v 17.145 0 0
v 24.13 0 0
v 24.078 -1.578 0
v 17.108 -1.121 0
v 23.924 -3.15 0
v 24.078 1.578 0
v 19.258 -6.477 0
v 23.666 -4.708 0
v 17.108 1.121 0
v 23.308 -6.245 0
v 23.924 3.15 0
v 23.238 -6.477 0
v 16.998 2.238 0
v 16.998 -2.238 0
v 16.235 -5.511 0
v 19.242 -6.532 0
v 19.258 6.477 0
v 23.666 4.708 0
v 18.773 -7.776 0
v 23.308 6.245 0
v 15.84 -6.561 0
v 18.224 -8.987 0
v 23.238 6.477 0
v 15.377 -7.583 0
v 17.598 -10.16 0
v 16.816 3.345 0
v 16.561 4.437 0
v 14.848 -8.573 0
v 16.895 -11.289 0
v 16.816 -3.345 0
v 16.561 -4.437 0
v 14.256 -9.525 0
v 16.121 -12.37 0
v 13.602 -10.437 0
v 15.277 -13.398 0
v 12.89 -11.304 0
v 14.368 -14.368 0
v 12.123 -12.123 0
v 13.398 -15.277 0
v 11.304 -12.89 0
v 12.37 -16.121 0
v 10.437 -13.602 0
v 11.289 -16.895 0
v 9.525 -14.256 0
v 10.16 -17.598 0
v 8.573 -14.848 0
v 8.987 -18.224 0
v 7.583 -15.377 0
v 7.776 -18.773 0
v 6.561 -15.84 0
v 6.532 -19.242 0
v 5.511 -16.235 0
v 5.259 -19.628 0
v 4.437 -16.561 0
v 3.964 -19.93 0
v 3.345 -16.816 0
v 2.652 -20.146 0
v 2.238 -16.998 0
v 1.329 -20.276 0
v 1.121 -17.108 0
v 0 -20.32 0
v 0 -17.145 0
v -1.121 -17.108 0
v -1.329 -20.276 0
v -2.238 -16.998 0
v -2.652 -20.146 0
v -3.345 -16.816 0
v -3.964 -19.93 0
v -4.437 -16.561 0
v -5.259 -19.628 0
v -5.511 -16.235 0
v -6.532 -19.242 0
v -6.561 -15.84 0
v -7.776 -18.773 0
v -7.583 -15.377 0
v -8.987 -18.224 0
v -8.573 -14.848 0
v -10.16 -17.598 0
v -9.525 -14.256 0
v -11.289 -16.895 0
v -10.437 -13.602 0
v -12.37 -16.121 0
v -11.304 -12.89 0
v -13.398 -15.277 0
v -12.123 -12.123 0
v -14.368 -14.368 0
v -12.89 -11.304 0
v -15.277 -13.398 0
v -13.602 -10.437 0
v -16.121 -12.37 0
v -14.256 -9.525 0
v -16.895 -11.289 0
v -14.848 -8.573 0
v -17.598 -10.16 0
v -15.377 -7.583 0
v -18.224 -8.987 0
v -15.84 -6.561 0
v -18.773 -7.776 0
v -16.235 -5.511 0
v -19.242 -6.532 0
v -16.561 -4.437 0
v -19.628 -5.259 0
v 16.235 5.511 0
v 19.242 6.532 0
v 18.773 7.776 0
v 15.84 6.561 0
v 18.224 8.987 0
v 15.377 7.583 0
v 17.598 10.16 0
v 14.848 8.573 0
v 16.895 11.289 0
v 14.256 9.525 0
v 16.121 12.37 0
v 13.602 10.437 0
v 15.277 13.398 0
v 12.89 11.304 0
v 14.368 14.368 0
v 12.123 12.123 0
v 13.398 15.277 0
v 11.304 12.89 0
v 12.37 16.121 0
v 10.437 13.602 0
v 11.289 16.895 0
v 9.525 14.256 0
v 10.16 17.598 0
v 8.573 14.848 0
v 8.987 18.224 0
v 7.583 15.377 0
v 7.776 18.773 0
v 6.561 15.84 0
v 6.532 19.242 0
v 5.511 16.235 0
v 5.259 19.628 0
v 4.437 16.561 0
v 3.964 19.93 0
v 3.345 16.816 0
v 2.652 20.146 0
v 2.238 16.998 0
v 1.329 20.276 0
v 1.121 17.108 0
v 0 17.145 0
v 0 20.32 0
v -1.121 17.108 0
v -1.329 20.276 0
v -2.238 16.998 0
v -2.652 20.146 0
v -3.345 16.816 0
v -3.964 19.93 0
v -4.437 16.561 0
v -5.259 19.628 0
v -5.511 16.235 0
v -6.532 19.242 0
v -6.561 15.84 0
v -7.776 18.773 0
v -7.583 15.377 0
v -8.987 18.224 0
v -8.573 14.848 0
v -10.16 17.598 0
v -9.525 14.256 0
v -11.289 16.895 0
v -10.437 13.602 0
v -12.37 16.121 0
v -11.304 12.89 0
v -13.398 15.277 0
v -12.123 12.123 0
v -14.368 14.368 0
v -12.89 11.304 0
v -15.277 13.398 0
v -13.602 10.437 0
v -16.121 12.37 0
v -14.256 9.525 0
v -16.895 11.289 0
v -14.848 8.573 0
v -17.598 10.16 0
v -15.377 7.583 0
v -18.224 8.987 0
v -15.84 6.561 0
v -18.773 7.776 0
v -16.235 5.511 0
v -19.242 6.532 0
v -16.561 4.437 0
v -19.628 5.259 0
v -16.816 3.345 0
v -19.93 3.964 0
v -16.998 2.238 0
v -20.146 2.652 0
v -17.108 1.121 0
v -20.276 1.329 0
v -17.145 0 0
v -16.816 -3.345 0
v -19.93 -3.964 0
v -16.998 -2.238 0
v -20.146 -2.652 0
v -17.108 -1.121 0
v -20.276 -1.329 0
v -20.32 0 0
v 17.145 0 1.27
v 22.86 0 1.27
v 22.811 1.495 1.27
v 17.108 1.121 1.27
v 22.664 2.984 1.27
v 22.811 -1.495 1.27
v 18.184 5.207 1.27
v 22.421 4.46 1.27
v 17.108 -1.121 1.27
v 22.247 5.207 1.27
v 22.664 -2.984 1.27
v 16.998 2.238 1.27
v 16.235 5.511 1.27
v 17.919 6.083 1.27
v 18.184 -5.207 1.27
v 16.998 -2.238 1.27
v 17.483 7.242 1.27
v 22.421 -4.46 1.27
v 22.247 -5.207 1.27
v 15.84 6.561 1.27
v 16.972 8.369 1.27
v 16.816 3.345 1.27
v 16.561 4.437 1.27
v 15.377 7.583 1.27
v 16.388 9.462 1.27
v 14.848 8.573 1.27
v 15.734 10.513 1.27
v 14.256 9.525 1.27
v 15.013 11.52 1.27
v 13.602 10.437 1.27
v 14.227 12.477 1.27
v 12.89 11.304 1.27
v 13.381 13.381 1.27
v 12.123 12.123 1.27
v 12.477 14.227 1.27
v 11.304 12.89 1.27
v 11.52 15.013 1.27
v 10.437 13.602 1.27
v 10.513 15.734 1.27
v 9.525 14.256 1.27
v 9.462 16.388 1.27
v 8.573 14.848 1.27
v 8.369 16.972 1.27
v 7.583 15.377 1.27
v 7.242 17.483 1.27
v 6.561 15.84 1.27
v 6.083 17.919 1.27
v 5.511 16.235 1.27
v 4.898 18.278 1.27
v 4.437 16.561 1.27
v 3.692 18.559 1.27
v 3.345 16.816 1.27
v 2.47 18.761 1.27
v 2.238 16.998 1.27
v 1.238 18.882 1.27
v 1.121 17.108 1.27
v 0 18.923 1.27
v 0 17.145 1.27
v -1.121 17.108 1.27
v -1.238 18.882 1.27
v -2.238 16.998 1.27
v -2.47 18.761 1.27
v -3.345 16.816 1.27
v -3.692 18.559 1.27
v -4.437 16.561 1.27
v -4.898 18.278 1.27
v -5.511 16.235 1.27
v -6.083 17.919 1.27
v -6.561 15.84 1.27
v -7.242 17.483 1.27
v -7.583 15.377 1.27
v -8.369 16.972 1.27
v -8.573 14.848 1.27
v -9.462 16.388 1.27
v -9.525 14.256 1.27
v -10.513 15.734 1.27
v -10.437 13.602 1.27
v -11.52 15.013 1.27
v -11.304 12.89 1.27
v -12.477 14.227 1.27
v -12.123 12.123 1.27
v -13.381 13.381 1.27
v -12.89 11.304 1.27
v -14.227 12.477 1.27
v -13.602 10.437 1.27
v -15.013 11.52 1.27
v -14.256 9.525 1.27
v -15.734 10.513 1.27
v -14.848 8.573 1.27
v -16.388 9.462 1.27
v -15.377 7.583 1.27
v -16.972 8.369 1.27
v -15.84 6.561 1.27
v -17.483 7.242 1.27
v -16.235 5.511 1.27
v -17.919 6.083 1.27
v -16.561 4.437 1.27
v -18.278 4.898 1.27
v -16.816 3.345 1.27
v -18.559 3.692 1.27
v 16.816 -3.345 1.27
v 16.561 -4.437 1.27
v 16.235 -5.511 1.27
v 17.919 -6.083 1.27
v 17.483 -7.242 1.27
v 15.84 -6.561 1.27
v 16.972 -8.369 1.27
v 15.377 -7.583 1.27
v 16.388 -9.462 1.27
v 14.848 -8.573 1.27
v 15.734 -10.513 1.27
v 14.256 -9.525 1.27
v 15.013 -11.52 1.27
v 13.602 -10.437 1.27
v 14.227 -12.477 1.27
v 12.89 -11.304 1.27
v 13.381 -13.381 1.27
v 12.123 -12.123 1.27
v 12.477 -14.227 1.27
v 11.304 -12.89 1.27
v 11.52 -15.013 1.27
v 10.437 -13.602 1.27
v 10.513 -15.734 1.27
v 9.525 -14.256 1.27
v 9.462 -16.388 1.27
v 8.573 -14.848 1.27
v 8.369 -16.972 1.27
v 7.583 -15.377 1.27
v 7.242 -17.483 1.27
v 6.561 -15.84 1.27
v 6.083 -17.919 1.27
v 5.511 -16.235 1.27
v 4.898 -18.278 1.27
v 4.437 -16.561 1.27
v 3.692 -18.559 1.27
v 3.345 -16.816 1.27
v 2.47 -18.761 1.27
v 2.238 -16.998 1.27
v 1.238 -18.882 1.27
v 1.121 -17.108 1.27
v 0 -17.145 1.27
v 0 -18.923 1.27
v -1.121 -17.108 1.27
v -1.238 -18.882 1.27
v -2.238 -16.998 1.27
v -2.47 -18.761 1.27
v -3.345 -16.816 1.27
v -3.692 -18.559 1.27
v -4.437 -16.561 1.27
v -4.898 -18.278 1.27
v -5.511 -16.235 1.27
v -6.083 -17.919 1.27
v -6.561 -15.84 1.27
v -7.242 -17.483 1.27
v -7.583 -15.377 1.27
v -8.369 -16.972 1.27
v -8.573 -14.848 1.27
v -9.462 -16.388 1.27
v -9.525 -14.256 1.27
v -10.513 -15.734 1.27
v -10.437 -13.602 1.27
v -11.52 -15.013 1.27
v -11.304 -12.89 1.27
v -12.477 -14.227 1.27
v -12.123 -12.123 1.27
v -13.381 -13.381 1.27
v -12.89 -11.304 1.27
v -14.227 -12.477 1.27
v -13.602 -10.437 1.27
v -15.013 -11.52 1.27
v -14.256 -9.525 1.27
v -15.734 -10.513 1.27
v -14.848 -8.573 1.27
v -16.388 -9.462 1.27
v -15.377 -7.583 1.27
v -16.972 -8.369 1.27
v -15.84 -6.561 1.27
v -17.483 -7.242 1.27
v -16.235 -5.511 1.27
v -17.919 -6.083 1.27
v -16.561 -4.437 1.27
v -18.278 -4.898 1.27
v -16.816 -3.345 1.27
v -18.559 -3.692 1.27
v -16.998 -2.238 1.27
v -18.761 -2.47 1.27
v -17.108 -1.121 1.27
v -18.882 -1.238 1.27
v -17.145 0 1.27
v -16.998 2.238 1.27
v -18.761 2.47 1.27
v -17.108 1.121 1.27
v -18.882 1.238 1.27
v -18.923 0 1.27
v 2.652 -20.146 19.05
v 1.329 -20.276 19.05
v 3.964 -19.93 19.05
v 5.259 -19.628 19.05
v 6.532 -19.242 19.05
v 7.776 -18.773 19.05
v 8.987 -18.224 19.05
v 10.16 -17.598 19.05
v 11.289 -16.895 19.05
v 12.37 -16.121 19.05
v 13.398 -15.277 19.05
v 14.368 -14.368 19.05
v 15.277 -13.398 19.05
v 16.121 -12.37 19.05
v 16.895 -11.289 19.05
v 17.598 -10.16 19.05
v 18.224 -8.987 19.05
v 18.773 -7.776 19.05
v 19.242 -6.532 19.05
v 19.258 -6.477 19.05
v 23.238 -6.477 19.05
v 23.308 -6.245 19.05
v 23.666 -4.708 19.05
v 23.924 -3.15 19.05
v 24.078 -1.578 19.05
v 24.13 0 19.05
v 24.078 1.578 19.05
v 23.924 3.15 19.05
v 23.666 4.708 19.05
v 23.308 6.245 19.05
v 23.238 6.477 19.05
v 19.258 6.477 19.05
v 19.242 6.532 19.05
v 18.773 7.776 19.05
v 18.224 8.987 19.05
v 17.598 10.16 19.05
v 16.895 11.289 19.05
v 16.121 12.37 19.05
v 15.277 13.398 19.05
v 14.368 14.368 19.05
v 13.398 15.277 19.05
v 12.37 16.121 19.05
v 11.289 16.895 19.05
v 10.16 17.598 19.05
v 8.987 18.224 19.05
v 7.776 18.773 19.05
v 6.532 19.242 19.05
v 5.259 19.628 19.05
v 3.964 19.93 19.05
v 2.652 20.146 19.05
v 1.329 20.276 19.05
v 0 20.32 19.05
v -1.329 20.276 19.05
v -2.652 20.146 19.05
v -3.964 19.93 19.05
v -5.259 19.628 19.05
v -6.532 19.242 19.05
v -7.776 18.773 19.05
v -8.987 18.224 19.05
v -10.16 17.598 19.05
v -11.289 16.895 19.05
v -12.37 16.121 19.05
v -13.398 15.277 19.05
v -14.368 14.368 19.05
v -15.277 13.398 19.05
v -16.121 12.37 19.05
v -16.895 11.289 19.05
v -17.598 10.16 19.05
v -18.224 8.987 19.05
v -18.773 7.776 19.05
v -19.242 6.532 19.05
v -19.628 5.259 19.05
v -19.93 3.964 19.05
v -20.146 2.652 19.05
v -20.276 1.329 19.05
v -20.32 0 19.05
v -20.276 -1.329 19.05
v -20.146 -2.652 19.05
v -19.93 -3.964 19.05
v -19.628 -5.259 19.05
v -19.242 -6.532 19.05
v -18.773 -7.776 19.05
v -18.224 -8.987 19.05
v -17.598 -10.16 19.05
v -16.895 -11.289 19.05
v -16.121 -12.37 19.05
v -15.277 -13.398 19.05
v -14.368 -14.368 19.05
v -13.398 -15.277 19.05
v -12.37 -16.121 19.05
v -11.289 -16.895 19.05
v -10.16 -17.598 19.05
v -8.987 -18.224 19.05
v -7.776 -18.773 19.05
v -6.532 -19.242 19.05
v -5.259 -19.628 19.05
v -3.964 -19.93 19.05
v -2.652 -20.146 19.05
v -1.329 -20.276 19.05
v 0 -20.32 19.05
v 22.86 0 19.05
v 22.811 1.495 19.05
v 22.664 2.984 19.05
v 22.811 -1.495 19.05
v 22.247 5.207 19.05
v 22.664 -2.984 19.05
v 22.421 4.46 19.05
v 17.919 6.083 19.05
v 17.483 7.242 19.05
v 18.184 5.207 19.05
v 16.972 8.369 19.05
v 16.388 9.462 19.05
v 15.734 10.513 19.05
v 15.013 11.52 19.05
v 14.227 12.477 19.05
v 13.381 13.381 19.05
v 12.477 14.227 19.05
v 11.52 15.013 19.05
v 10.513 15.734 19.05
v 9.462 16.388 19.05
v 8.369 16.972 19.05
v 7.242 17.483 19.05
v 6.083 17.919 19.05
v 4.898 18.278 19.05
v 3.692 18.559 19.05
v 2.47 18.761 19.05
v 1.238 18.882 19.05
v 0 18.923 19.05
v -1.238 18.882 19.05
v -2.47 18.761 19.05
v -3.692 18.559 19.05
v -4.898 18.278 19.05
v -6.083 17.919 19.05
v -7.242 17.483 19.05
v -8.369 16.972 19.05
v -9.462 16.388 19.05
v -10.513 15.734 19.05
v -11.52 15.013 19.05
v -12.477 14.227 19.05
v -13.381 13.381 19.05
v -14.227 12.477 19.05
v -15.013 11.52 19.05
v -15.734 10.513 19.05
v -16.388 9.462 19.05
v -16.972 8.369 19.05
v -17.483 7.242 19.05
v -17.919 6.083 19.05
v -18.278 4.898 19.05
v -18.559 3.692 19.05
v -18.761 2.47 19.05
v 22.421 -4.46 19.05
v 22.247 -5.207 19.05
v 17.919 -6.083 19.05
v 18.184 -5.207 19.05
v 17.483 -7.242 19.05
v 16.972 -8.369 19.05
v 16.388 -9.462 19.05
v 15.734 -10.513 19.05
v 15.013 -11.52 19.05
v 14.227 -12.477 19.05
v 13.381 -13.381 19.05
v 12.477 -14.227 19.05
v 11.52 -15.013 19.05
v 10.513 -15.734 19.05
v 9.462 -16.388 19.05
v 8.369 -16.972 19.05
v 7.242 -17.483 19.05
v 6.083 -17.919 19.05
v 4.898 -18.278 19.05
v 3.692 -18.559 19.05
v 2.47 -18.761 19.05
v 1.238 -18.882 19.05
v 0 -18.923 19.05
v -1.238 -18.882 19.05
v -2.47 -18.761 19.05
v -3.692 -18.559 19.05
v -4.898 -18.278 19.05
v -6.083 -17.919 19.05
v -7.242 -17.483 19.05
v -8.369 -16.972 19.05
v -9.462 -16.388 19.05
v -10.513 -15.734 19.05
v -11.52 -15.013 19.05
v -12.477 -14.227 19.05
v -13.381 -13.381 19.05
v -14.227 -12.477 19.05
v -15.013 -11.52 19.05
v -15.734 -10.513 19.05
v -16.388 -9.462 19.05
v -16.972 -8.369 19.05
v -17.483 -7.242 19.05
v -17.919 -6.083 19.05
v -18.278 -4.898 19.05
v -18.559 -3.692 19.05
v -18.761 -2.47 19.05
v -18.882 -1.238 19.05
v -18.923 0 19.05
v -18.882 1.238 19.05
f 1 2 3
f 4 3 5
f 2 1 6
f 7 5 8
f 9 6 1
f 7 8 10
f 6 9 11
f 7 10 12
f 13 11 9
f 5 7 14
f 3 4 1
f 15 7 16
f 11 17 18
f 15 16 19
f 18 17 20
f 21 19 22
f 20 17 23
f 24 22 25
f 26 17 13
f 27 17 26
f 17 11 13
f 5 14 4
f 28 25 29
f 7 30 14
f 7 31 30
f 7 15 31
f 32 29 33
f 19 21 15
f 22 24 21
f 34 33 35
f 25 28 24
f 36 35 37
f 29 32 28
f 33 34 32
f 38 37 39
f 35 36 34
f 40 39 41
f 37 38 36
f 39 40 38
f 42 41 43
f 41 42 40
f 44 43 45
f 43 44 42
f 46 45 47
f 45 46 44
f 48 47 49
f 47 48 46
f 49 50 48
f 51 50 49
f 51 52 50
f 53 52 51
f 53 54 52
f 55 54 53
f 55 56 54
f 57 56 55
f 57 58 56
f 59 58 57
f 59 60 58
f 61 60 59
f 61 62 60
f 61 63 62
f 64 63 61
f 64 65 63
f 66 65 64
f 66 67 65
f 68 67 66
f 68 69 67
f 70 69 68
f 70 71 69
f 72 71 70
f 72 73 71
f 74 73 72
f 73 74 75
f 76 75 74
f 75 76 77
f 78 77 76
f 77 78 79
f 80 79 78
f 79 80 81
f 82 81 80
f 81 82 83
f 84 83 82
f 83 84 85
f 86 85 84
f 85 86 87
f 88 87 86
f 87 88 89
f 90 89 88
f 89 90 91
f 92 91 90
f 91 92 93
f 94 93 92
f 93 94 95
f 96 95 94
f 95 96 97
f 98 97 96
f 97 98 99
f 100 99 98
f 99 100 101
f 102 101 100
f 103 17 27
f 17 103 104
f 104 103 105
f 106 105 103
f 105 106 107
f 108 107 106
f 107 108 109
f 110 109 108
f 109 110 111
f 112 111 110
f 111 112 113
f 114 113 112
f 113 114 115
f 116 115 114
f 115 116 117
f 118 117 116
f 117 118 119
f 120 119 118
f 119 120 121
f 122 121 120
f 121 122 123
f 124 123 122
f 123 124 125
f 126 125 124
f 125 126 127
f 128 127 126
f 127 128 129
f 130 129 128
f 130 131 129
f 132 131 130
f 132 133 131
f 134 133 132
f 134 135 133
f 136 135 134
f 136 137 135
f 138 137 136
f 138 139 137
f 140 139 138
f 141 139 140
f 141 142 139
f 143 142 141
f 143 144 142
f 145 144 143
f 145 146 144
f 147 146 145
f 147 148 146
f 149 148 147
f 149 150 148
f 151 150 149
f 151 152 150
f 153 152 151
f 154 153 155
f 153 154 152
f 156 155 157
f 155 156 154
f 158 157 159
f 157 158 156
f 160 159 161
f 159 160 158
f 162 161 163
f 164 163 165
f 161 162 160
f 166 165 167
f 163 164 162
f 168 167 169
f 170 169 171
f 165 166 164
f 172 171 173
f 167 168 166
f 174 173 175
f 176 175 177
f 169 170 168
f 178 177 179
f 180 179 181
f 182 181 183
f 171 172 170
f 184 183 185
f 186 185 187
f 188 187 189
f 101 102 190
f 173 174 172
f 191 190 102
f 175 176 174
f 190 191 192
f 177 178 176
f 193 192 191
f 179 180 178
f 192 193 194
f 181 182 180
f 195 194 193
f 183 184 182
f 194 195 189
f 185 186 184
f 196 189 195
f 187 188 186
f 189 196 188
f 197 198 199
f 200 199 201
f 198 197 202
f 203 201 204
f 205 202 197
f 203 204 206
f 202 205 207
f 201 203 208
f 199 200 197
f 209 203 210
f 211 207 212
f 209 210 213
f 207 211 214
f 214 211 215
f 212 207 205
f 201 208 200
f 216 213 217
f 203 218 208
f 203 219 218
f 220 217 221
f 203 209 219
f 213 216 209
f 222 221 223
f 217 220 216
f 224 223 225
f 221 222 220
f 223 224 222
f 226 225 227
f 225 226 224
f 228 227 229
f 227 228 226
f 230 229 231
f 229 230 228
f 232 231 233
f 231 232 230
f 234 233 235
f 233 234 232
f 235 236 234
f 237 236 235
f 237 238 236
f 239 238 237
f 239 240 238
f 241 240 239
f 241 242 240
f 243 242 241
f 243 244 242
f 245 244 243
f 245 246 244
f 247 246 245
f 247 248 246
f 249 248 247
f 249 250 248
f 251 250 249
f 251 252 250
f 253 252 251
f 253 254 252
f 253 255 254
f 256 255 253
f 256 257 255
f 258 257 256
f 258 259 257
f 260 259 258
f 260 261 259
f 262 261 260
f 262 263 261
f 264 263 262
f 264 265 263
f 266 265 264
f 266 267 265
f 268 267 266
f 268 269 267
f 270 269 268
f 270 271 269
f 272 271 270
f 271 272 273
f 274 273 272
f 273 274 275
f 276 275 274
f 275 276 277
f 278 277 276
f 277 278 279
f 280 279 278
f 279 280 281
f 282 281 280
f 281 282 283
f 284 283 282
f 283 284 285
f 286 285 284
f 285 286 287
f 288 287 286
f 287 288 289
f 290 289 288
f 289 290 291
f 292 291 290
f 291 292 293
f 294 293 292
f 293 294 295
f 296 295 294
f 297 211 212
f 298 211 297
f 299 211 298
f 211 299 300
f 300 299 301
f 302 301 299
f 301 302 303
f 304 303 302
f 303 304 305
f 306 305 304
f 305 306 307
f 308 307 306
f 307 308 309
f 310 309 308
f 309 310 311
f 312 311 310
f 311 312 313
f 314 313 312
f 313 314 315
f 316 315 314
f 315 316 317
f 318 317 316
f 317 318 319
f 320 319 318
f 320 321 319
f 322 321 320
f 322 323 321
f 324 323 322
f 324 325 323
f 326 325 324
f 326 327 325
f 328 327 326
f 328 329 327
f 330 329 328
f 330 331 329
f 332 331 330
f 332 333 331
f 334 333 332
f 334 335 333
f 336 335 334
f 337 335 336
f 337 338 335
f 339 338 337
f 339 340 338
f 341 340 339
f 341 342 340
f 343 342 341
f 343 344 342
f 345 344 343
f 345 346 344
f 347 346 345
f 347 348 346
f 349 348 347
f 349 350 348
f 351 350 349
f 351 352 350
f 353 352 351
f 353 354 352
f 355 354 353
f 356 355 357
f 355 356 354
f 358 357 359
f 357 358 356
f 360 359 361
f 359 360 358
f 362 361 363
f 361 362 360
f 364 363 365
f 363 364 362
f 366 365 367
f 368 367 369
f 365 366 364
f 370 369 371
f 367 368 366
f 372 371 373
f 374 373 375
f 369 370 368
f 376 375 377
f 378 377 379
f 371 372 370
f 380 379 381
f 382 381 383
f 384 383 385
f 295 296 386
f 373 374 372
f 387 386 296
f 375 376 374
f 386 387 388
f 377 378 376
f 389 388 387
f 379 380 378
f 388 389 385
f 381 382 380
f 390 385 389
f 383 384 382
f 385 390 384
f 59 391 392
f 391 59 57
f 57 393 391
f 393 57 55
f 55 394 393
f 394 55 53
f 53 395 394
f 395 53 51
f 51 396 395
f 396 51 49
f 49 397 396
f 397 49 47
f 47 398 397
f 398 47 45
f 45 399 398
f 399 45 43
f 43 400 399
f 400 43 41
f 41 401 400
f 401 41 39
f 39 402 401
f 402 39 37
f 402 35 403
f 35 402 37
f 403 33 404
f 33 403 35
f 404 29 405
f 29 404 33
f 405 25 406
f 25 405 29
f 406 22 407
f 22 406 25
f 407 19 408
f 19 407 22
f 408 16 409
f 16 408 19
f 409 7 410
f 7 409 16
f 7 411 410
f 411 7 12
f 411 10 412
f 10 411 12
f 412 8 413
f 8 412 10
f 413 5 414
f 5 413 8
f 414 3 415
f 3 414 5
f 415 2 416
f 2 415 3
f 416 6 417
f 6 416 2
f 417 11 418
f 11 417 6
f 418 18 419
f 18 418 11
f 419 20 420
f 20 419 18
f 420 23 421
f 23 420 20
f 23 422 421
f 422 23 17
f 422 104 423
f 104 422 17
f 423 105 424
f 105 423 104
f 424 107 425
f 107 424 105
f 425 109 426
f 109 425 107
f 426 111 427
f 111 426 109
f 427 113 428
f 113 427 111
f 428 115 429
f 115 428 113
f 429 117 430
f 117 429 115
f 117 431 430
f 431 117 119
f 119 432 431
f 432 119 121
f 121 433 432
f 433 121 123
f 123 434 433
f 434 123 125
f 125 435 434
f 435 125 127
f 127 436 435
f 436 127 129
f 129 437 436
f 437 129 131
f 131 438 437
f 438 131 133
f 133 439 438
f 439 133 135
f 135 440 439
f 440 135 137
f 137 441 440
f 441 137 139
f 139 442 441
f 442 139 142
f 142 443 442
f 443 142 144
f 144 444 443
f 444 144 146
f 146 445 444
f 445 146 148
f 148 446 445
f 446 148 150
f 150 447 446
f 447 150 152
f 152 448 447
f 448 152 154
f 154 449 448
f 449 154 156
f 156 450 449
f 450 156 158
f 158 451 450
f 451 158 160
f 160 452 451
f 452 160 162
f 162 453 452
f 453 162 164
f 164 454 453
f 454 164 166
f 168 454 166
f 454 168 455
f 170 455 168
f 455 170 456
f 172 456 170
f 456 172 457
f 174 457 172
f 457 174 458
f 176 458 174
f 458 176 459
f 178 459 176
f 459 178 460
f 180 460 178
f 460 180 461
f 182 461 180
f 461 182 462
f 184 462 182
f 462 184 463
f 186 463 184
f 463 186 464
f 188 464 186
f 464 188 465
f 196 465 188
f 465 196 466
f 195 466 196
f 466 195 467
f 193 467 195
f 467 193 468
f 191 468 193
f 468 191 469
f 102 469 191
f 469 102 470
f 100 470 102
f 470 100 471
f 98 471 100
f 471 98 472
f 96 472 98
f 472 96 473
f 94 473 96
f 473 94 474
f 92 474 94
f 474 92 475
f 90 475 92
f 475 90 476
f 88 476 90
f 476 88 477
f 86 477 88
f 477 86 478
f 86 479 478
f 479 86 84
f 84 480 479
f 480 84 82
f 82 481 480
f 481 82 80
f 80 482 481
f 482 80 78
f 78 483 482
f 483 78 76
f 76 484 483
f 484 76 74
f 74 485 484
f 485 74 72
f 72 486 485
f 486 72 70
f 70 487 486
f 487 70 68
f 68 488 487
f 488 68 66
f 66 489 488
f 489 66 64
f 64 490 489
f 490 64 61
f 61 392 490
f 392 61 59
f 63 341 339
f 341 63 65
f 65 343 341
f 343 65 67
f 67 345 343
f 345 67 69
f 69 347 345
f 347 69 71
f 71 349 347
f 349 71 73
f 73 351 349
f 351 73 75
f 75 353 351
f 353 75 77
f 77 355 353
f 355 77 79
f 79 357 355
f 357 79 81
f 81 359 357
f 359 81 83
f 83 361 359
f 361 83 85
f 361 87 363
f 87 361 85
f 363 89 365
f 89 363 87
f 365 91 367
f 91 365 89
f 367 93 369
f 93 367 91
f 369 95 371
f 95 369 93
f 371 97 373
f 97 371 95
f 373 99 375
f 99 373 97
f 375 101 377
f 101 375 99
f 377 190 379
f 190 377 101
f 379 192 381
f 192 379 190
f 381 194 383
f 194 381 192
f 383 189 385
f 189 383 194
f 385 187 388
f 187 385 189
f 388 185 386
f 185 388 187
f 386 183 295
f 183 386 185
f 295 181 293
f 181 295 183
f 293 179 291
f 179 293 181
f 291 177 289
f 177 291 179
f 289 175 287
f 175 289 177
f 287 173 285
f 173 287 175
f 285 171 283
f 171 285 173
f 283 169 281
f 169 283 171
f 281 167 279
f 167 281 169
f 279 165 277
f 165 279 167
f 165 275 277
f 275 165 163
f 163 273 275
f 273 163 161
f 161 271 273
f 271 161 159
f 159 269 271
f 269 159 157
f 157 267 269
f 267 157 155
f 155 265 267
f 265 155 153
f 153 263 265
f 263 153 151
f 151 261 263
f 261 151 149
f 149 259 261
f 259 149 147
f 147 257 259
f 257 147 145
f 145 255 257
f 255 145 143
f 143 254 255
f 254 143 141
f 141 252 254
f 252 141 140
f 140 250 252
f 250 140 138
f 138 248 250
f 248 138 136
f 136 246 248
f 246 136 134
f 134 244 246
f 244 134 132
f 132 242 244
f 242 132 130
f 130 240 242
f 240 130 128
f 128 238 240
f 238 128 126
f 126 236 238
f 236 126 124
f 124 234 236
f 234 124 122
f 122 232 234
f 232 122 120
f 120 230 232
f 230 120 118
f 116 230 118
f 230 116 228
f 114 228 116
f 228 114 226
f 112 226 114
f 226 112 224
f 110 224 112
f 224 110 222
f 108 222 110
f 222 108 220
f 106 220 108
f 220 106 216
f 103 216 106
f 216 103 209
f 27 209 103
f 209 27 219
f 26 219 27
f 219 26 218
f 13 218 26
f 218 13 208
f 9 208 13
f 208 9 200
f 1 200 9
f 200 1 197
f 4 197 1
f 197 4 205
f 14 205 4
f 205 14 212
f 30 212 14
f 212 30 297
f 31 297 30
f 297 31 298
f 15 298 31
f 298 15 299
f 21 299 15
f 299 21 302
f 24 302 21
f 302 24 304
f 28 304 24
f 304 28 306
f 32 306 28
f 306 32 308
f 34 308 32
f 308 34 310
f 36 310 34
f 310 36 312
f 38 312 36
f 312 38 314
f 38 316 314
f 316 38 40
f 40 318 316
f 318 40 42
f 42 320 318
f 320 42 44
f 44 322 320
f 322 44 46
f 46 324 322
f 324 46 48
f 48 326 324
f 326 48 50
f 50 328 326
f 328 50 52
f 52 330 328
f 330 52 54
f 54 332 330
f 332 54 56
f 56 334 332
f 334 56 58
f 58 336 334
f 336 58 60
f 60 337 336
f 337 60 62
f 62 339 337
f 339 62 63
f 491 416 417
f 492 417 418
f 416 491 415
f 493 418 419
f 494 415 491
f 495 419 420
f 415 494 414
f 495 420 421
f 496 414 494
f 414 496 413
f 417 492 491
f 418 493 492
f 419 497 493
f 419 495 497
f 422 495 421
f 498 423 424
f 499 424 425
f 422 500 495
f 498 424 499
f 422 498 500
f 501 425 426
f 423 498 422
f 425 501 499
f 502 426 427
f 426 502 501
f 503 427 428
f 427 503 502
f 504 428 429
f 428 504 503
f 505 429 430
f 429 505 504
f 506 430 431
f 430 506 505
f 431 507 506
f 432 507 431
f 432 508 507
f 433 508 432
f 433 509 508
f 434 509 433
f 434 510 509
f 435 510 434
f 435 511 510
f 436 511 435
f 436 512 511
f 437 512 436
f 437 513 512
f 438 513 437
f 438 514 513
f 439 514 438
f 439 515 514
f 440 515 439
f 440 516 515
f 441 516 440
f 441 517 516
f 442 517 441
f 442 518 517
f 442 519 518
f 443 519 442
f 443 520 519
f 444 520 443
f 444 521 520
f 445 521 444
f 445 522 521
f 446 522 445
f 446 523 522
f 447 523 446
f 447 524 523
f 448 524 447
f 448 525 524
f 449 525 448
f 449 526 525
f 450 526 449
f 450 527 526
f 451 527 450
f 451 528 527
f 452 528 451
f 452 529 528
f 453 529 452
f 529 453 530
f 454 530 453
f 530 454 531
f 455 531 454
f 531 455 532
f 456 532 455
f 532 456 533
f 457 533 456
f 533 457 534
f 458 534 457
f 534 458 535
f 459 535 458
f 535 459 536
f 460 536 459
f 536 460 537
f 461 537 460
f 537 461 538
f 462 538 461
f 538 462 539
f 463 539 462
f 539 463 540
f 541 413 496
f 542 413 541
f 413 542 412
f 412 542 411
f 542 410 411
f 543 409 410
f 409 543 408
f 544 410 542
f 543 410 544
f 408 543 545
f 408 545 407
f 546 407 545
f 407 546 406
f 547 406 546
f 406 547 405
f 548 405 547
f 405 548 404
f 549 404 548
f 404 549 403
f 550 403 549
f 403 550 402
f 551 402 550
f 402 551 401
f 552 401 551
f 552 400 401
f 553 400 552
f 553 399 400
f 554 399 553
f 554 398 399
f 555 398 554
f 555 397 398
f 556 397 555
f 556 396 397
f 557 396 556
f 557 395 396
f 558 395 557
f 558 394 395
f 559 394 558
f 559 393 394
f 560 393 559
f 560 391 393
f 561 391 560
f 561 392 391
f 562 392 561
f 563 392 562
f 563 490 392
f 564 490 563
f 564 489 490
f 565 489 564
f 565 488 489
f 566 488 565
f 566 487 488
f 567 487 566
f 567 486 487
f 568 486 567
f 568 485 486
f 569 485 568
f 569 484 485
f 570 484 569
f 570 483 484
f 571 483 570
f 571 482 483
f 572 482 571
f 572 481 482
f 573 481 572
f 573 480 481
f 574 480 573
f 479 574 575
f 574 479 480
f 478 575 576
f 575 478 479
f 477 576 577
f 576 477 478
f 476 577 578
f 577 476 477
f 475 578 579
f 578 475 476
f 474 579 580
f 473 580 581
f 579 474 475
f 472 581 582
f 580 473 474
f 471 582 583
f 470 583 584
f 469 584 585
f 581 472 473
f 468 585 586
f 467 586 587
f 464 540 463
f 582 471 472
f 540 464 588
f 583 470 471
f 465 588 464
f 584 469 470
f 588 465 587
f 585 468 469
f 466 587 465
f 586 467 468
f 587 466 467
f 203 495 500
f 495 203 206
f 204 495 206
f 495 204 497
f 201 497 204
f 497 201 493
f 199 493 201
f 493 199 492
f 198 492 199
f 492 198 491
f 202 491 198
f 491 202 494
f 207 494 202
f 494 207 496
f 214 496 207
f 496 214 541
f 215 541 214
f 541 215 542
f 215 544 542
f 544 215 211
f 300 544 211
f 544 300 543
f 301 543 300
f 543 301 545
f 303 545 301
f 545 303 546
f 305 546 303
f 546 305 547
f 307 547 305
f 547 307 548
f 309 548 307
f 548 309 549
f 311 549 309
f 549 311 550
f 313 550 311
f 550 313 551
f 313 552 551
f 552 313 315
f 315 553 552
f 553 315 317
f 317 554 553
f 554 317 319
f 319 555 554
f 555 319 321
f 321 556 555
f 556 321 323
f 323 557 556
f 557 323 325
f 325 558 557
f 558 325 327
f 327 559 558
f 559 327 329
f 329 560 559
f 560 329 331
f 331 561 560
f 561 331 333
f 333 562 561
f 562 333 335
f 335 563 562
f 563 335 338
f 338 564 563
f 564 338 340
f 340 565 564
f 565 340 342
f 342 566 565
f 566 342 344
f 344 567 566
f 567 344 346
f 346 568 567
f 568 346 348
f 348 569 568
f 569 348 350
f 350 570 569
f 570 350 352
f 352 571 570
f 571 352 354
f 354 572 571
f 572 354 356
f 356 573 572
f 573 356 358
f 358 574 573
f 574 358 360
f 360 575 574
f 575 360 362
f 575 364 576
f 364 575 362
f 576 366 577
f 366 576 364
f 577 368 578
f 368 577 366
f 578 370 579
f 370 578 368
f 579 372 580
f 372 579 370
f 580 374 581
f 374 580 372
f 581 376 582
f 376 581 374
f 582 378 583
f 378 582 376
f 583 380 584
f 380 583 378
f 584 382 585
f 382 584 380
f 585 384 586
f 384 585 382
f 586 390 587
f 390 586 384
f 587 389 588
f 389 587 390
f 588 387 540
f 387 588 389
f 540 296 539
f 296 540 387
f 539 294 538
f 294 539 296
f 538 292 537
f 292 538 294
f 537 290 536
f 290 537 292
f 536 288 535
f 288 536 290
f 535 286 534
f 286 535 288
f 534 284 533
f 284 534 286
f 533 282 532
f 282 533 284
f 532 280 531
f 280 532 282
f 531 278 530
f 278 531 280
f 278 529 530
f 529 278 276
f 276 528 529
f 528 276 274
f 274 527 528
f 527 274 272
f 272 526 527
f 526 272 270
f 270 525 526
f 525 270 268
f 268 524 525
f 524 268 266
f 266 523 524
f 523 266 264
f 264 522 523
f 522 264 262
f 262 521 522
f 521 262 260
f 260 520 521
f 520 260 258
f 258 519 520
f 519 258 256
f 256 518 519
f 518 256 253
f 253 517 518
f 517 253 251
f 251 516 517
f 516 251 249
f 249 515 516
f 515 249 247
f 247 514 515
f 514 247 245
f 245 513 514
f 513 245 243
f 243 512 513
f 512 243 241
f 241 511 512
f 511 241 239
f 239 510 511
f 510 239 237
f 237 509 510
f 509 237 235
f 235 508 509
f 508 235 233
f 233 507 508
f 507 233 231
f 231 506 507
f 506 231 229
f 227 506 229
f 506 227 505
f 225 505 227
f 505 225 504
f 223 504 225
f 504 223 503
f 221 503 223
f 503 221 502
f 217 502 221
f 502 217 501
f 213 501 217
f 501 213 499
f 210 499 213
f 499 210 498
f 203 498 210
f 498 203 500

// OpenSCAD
ViewScale = [0.0254, 0.0254, 0.0254];

module cutouts()
{
   difference() {
        circle(1600/2, $fn=96);
        circle(1490/2, $fn=96);
        // tab
        translate([0, 700, 0])
        square([400, 200], center=true);
        // tab
//        rotate([0, 0, 120]) 
//        translate([0, 700, 0])
//        square([400, 200], center=true);
        // tab
//        rotate([0, 0, 240]) 
//        translate([0, 700, 0])
//        square([400, 200], center=true);
    }
}

//module rotcutouts() {
//    for(ii=[0:90:360]) {
//        rotate([0, 0, ii])
//        translate([0, 500, 0])
//        square([400, 200], center=true);
//    }
//}

module bodymain()
{
    difference() {
        circle(1600/2, $fn=96);
        circle(1490/2, $fn=96);
    }
}

//module bodycutout()
//{
//    difference() {
//        circle(1460/2, $fn=96);
//        circle(1360/2, $fn=96);
//        *square([1020, 1020], center=true);
//        translate([0, 700, 0])
//        square([400, 200], center=true);
//        scale([1.3,1.3,1.3])
//        translate([0, 500, 0])
//        square([400, 200], center=true);
//        //rotcutouts();
//    }
//}

module bodycutout2()
{
    difference() {
        circle(1460/2, $fn=96);
        circle(1360/2, $fn=96);
        scale([1.3,1.3,1.3])
        translate([0, 500, 0])
        square([400, 200], center=true);
        //rotcutouts();
    }
}

//module ledframe2()
//{
//    difference() {
//    square([1030, 1030], center=true);
//    square([800, 800], center=true);
//    rotcutouts();
////    translate([0, 500, 0])
////    square([400, 200], center=true);
//    }
//}
//
//module ledframe1()
//{
//    difference() {
//        square([1030, 1030], center=true);
//        square([900, 900], center=true);
//        rotcutouts();
//    }
//}

//module support()
//{
//    difference() {
//    square([860, 860], center=true);
//    square([760, 760], center=true);
//    }
//}

//module mirror()
//{
//    translate([-525/2, 0, 500])
//    rotate([135, 0, 0]) {
//        translate([-10, 0, -500]) {
//        linear_extrude(1000)
//        difference() {
//            square([545, 164]);
//            translate([94/2, 0, 0])
//            square([445, 114]);
//        }
//        translate([0, 0, 1000])
//        linear_extrude(50)
//        square([525, 164]);
//    }}
//}

module cap() 
{
    difference() {
        circle(1600/2, $fn=96);
        circle(1350/2, $fn=96);
    }
}

//module vexmount1()
//{
//    difference() {
//        hull() {
//            circle(380/2);
//            translate([0, 1000, 0])
//            square([380, 380], center=true);
//        }
//        circle(200/2);
//    }
//}


//module vexmount()
//{
//    linear_extrude(150) {
//        vexmount1();
//        translate([1000, 0, 0])
//        vexmount1();
//    }
//}

//module mountsupport()
//{
//    square([700, 100], center=true);
//}

module csouter() 
{
    difference() {
        intersection() {
            circle(1900/2, $fn=96);
            translate([900, 0, 0])
            square([500, 510], center=true);
        }
       circle(1800/2, $fn=96);
   }
}

module csouter2() 
{
    difference() {
        intersection() {
            circle(1900/2, $fn=96);
            translate([900, 0, 0])
            square([500, 510], center=true);
        }
       circle(1490/2, $fn=96);
   }
}

module cssides()
{
    difference() {
        union() {
           translate([800, 230, 0])
           square([300,50], center=true);
           translate([800, -230, 0])
           square([300,50], center=true);
        }
        circle(1490/2, $fn=96);
    }
}

module cableshroud1()
{
    csouter2();
    difference() {
        circle(1600/2, $fn=96);
        circle(1350/2, $fn=96);
    }
}

module cableshroud2()
{
    intersection() {
        union() {
            csouter();
            cssides();
        }
        circle(1900/2, $fn=96);
    }
    // inner cutout
    difference() {
        circle(1600/2, $fn=96);
        circle(1490/2, $fn=96);
        translate([900, 0, 0])
        square([500, 510], center=true);
    }
}

scale(ViewScale)
{
//    #linear_extrude(200){
//        ledframe1();
//        bodycutout();
//    }
//    #linear_extrude(170)
//    support();
//
//    #translate([0, 0, 200])
//    linear_extrude(200)
//    bodycutout2();
//
//    #translate([0, 0, 200])
//    linear_extrude(200)
//    ledframe2();

//    translate([0, 0, 0])
//    linear_extrude(300)
//    cutouts();
//
//    translate([0, 0, 300])
//    linear_extrude(200)
//    bodymain();
//
//    #translate([0, 0, 500])
//    linear_extrude(50)
//    cap();

    *translate([0, 0, 300])
    mirror();

    *translate([-500, 690, 1190])
    rotate([-90, 0, 0])
    vexmount();

    *translate([0, 790, 300])
    linear_extrude(250)
    mountsupport();

    linear_extrude(50)
    cableshroud1();

    translate([0, 0, 50])
    linear_extrude(700)
    cableshroud2();

}
